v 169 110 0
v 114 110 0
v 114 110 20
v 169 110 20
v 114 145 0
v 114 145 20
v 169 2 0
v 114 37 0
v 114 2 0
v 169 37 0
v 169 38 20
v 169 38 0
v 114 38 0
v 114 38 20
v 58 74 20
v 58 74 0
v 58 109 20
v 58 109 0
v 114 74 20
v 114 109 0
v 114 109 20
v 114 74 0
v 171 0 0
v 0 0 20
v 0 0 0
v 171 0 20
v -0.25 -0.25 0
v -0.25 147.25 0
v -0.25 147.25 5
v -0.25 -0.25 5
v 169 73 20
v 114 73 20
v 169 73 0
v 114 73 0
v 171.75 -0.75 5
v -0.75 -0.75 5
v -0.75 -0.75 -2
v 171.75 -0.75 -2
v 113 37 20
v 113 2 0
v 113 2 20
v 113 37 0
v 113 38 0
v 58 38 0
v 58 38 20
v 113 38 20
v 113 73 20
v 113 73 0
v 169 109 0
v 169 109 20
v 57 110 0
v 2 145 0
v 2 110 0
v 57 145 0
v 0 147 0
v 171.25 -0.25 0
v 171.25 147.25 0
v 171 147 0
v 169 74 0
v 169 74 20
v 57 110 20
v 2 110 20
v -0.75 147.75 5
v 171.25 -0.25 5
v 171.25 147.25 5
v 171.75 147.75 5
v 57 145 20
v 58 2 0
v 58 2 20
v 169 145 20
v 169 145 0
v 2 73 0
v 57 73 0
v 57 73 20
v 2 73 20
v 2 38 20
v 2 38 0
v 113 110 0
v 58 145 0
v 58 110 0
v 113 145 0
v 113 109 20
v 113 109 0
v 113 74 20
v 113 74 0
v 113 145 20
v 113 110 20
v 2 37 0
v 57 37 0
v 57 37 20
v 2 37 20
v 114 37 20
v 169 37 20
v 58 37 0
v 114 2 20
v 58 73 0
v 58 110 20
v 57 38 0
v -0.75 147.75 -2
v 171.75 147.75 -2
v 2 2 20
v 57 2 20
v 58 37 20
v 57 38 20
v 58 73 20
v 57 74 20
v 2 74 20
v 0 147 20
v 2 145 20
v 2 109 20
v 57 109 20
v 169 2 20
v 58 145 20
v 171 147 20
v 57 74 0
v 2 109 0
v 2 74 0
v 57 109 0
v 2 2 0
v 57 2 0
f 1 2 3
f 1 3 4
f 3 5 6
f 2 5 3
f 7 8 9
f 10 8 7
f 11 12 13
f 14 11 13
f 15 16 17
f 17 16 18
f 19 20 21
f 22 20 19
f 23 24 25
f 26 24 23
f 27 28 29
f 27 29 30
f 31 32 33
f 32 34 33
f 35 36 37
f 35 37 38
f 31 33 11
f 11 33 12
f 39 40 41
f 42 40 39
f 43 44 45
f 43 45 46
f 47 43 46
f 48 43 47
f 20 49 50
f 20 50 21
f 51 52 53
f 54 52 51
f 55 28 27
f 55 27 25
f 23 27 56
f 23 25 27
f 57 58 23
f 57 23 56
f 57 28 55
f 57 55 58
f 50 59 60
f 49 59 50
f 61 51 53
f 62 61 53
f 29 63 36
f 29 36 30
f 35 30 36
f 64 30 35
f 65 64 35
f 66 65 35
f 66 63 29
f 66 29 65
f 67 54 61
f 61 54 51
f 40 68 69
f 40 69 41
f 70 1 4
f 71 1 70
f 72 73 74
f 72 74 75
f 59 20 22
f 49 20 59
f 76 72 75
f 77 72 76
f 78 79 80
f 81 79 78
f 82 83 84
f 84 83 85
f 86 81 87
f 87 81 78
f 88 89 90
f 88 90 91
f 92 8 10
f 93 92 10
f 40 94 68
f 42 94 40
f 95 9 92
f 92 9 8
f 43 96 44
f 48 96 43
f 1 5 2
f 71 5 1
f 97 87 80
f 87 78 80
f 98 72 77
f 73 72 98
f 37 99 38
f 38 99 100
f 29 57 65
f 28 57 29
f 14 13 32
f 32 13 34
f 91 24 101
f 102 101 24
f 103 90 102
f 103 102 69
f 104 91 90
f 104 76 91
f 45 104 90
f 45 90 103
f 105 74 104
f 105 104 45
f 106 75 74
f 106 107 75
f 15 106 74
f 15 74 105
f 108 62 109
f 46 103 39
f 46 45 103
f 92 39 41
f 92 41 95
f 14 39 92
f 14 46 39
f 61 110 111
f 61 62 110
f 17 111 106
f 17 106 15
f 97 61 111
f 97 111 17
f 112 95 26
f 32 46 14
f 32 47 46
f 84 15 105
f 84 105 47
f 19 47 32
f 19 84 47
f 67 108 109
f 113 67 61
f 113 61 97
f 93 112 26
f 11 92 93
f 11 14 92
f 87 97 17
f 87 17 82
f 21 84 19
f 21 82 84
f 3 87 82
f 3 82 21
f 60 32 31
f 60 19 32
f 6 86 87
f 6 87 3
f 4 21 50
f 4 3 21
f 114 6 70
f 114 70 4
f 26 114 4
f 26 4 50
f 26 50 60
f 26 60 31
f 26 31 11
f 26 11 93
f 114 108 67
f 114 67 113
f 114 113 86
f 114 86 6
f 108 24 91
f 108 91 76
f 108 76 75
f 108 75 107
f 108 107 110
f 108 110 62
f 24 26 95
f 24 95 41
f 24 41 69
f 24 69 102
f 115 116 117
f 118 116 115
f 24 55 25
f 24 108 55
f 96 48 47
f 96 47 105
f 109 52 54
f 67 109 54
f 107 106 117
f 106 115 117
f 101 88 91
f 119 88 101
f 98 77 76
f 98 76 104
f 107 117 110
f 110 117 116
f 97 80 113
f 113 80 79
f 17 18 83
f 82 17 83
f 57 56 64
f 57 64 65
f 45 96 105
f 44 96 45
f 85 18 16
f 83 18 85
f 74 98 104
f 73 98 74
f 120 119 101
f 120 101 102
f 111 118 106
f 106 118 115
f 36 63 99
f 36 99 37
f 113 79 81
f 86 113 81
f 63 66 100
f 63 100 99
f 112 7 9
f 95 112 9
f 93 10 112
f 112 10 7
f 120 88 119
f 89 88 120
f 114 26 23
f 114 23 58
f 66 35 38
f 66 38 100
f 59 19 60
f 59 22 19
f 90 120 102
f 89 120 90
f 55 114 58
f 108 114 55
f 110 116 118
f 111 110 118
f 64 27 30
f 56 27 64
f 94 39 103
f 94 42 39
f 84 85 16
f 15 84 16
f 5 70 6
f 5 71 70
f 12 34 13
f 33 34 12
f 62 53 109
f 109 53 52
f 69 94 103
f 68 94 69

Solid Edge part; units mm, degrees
sketch "Sketch1" plane through (0, 0, 0) normal (0, 0, 1) x (1, 0, 0)
  line L0 (171, 147) -> (0, 147)
  line L1 (0, 147) -> (0, 0)
  line L2 (0, 0) -> (171, 0)
  line L3 (171, 0) -> (171, 147)
extrude "Protrusion1" add sketch "Sketch1" against normal blind 2
sketch "Sketch2" plane through (0, 0, 0) normal (0, 0, 1) x (1, 0, 0)
  line L0 (113, 74) -> (58, 74)
  line L1 (58, 74) -> (58, 109)
  line L2 (58, 109) -> (113, 109)
  line L3 (113, 109) -> (113, 74)
  line L4 (58, 37) -> (58, 2)
  line L5 (58, 2) -> (113, 2)
  line L6 (113, 2) -> (113, 37)
  line L7 (113, 37) -> (58, 37)
  line L8 (58, 73) -> (58, 38)
  line L9 (58, 38) -> (113, 38)
  line L10 (113, 38) -> (113, 73)
  line L11 (113, 73) -> (58, 73)
  line L12 (2, 73) -> (2, 38)
  line L13 (2, 38) -> (57, 38)
  line L14 (57, 38) -> (57, 73)
  line L15 (57, 73) -> (2, 73)
  line L16 (2, 37) -> (2, 2)
  line L17 (2, 2) -> (57, 2)
  line L18 (57, 2) -> (57, 37)
  line L19 (57, 37) -> (2, 37)
  line L20 (57, 74) -> (2, 74)
  line L21 (2, 74) -> (2, 109)
  line L22 (2, 109) -> (57, 109)
  line L23 (57, 109) -> (57, 74)
  line L24 (171, 147) -> (0, 147)
  line L25 (0, 147) -> (0, 0)
  line L26 (0, 0) -> (171, 0)
  line L27 (171, 0) -> (171, 147)
  line L28 (57, 110) -> (2, 110)
  line L29 (2, 110) -> (2, 145)
  line L30 (2, 145) -> (57, 145)
  line L31 (57, 145) -> (57, 110)
  line L32 (114, 73) -> (169, 73)
  line L33 (169, 73) -> (169, 38)
  line L34 (169, 38) -> (114, 38)
  line L35 (114, 38) -> (114, 73)
  line L36 (114, 37) -> (169, 37)
  line L37 (169, 37) -> (169, 2)
  line L38 (169, 2) -> (114, 2)
  line L39 (114, 2) -> (114, 37)
  line L40 (113, 145) -> (113, 110)
  line L41 (113, 110) -> (58, 110)
  line L42 (58, 110) -> (58, 145)
  line L43 (58, 145) -> (113, 145)
  line L44 (169, 109) -> (114, 109)
  line L45 (114, 109) -> (114, 74)
  line L46 (114, 74) -> (169, 74)
  line L47 (169, 74) -> (169, 109)
  line L48 (114, 145) -> (114, 110)
  line L49 (114, 110) -> (169, 110)
  line L50 (169, 110) -> (169, 145)
  line L51 (169, 145) -> (114, 145)
  dimension "D1" = 171
  dimension "D2" = 147
  dimension "D3" = 55
  dimension "D4" = 35
  dimension "D5" = 2
  dimension "D6" = 2
  dimension "D7" = 55
  dimension "D8" = 35
  dimension "D9" = 1
  dimension "D10" = 2
  dimension "D11" = 2
  dimension "D12" = 55
  dimension "D13" = 55
  dimension "D14" = 35
  dimension "D15" = 35
  dimension "D16" = 1
  dimension "D17" = 1
  dimension "D18" = 1
  dimension "D19" = 171.5
  dimension "D20" = 147.5
extrude "FuseBoxHolder" add sketch "Sketch2" along normal blind 20
sketch "Sketch3" plane through (0, 0, 0) normal (0, 0, 1) x (1, 0, 0)
  line L0 (171.75, -0.75) -> (171.75, 147.75)
  line L1 (171.75, 147.75) -> (-0.75, 147.75)
  line L2 (-0.75, 147.75) -> (-0.75, -0.75)
  line L3 (-0.75, -0.75) -> (171.75, -0.75)
extrude "FuseBoxLidGround" add sketch "Sketch3" against normal blind 2
sketch "Sketch4" plane through (0, 0, 0) normal (0, 0, 1) x (1, 0, 0)
  line L0 (-0.25, 147.25) -> (-0.25, -0.25)
  line L1 (-0.25, -0.25) -> (171.25, -0.25)
  line L2 (171.25, -0.25) -> (171.25, 147.25)
  line L3 (171.25, 147.25) -> (-0.25, 147.25)
  line L4 (171.75, -0.75) -> (171.75, 147.75)
  line L5 (171.75, 147.75) -> (-0.75, 147.75)
  line L6 (-0.75, 147.75) -> (-0.75, -0.75)
  line L7 (-0.75, -0.75) -> (171.75, -0.75)
  dimension "D1" = 171
  dimension "D2" = 147
  dimension "D3" = 55
  dimension "D4" = 35
  dimension "D5" = 2
  dimension "D6" = 2
  dimension "D7" = 55
  dimension "D8" = 35
  dimension "D9" = 1
  dimension "D10" = 2
  dimension "D11" = 2
  dimension "D12" = 55
  dimension "D13" = 55
  dimension "D14" = 35
  dimension "D15" = 35
  dimension "D16" = 1
  dimension "D17" = 1
  dimension "D18" = 1
  dimension "D19" = 171.5
  dimension "D20" = 147.5
extrude "FuseBoxLidWalls" add sketch "Sketch4" along normal blind 5
